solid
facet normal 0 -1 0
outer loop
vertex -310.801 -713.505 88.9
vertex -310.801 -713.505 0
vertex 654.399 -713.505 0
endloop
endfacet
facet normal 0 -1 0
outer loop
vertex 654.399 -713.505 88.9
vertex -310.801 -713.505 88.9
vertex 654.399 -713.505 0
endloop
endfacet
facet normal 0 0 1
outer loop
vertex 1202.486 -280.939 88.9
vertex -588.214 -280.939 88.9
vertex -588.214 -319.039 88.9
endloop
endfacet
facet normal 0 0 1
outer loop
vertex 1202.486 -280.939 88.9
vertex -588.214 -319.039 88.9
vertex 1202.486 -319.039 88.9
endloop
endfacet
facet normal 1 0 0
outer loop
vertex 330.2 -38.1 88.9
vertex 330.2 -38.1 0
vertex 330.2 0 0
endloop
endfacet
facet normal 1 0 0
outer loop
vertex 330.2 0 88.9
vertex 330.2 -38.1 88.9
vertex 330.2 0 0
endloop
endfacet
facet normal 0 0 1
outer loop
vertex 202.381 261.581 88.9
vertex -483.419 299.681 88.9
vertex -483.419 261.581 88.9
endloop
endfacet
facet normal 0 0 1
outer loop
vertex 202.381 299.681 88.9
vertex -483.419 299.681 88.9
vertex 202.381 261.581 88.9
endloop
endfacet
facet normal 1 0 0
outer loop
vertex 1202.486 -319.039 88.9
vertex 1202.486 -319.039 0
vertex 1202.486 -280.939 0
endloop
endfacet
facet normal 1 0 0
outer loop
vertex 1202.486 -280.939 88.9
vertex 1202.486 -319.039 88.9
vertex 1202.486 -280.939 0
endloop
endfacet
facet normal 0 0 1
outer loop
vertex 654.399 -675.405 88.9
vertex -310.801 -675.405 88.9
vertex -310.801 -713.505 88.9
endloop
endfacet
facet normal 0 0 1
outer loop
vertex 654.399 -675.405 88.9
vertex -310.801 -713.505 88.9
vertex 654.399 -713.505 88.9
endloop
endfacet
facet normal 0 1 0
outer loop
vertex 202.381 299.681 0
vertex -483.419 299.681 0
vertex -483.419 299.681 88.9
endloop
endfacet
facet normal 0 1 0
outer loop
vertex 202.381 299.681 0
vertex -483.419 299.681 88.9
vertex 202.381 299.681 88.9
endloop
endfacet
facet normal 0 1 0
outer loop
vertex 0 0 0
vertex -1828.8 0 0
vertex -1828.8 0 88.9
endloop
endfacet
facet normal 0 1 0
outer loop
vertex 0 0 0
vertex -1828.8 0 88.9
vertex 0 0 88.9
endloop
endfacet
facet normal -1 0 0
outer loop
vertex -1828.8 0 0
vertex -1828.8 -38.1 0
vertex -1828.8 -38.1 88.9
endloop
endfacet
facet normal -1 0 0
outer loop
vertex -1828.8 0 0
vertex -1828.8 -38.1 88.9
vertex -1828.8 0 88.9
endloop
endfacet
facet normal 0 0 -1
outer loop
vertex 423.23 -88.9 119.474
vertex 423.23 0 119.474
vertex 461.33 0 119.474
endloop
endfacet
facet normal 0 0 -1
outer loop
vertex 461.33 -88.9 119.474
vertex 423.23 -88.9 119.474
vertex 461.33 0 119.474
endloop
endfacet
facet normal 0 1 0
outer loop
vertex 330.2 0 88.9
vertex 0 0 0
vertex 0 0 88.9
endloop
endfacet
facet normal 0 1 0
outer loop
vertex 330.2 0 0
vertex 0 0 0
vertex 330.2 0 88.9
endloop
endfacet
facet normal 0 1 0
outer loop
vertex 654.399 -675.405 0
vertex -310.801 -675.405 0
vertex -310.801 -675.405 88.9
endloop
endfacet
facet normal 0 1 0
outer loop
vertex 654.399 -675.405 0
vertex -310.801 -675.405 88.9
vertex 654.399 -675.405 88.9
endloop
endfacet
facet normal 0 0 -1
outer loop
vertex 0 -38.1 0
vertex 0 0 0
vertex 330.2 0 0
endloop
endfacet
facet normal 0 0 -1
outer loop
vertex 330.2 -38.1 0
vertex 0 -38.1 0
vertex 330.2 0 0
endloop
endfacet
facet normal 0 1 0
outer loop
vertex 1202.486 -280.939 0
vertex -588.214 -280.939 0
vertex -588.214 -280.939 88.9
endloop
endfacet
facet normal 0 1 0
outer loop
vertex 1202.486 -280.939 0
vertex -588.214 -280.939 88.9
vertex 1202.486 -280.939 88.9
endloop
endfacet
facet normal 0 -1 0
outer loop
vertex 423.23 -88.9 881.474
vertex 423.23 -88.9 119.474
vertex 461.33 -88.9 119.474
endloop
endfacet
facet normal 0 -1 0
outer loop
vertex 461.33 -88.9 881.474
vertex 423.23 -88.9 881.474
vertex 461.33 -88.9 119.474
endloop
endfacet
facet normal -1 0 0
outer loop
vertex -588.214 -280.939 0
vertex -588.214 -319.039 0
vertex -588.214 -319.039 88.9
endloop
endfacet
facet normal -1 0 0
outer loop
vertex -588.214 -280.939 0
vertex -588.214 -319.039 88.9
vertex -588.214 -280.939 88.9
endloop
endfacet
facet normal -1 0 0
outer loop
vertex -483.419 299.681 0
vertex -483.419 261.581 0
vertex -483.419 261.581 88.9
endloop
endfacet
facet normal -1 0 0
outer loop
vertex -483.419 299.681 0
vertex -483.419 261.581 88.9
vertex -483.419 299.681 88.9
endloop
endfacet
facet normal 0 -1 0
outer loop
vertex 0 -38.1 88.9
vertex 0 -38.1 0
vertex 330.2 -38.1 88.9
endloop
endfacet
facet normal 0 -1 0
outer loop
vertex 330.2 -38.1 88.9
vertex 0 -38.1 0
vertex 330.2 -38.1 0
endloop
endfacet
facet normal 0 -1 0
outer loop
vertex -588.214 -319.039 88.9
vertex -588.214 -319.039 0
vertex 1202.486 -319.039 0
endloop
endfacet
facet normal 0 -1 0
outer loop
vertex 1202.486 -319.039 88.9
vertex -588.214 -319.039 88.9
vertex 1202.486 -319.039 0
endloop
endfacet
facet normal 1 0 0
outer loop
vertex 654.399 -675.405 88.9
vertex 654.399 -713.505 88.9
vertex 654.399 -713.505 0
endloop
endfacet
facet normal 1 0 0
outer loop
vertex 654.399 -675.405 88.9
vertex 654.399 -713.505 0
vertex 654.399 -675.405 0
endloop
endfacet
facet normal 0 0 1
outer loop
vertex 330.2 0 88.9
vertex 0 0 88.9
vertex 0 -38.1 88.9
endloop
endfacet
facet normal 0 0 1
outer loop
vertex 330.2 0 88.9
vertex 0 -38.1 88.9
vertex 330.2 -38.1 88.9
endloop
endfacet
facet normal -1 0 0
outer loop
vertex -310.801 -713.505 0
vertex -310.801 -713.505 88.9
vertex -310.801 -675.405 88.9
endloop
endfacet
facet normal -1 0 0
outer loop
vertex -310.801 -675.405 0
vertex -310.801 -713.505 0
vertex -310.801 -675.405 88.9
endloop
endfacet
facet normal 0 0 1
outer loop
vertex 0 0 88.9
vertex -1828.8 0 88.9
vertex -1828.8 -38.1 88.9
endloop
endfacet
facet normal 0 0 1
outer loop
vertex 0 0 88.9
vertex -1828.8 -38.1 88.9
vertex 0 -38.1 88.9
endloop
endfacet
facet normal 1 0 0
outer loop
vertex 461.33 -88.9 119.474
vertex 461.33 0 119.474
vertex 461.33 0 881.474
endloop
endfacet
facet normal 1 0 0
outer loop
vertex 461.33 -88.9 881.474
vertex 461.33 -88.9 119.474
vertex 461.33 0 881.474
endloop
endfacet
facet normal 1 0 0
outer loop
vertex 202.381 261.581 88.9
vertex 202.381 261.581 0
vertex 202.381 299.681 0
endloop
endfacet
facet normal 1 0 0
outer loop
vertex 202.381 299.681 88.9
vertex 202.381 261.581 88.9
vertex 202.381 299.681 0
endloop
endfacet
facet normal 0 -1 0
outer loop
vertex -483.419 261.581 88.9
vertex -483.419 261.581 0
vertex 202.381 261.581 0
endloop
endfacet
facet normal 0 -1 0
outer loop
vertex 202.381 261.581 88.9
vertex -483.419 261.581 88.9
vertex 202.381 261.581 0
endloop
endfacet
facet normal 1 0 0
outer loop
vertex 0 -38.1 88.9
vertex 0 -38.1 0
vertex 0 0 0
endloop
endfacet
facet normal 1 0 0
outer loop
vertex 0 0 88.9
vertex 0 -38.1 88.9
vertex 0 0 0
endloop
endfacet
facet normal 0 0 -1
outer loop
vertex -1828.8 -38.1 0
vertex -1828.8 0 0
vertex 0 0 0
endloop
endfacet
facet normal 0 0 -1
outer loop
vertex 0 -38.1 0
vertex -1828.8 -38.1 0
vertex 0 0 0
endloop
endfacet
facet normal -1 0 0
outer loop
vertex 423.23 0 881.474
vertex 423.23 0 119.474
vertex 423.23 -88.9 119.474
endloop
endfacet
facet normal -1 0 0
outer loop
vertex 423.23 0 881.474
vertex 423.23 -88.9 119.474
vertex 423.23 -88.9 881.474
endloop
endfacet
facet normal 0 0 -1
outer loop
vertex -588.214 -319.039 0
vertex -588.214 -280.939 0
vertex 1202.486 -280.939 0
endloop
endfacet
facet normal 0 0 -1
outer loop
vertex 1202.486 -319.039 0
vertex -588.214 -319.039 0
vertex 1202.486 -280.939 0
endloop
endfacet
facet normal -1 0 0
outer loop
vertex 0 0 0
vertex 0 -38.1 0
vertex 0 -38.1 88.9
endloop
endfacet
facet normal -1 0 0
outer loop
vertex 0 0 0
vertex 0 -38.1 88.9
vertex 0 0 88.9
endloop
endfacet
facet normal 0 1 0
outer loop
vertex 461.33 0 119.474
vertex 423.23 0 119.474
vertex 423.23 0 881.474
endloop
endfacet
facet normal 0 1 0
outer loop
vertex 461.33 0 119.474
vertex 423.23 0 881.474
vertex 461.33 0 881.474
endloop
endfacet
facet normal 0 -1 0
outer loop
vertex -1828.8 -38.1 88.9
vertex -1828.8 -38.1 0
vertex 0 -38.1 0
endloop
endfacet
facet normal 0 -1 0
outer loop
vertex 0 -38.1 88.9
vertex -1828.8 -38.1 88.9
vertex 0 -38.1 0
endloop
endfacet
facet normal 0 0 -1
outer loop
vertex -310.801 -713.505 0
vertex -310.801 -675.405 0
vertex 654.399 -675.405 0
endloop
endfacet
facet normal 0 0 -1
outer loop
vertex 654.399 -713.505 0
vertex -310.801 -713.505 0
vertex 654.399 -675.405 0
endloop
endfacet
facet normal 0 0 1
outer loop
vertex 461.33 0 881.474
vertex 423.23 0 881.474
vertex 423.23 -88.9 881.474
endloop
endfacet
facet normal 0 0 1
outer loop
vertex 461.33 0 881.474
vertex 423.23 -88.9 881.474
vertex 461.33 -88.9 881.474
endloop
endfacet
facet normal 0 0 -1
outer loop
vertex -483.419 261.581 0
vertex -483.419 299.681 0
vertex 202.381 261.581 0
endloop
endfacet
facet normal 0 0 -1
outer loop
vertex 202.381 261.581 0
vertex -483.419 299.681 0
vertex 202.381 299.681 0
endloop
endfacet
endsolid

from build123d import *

# Parameters (mm, degrees)
F0_W      = 1828.8
F0_H      = 38.1
F1_DEPTH  = 88.9
F2_W      = 330.2
F2_H      = 38.1
F3_DEPTH  = 88.9
F4_W      = 1790.7
F4_H      = 38.1
F5_DEPTH  = 88.9
F6_W      = 965.2
F6_H      = 38.1
F7_DEPTH  = 88.9
F8_W      = 685.8
F8_H      = 38.1
F9_DEPTH  = 88.9
F10_W     = 38.1
F10_H     = 762
F11_DEPTH = 88.9


with BuildPart() as f1:
    # F0 (on Top) → F1 (new body)
    with BuildSketch(Plane.XY):
        with Locations((-914.4, -19.05)):
            Rectangle(F0_W, F0_H)
    extrude(amount=F1_DEPTH)


with BuildPart() as f3:
    # F2 (on Top) → F3 (new body)
    with BuildSketch(Plane.XY):
        with Locations((165.1, -19.05)):
            Rectangle(F2_W, F2_H)
    extrude(amount=F3_DEPTH)


with BuildPart() as f5:
    # F4 (on Top) → F5 (new body)
    with BuildSketch(Plane.XY):
        with Locations((307.136497, -299.989464)):
            Rectangle(F4_W, F4_H)
    extrude(amount=F5_DEPTH)


with BuildPart() as f7:
    # F6 (on Top) → F7 (new body)
    with BuildSketch(Plane.XY):
        with Locations((171.799448, -694.454732)):
            Rectangle(F6_W, F6_H)
    extrude(amount=F7_DEPTH)


with BuildPart() as f9:
    # F8 (on Top) → F9 (new body)
    with BuildSketch(Plane.XY):
        with Locations((-140.519447, 280.631093)):
            Rectangle(F8_W, F8_H)
    extrude(amount=F9_DEPTH)


with BuildPart() as f11:
    # F10 (on Front) → F11 (new body)
    with BuildSketch(Plane.XZ):
        with Locations((442.280414, 500.473763)):
            Rectangle(F10_W, F10_H)
    extrude(amount=F11_DEPTH)


solid = Compound([f1.part, f3.part, f5.part, f7.part, f9.part, f11.part])
